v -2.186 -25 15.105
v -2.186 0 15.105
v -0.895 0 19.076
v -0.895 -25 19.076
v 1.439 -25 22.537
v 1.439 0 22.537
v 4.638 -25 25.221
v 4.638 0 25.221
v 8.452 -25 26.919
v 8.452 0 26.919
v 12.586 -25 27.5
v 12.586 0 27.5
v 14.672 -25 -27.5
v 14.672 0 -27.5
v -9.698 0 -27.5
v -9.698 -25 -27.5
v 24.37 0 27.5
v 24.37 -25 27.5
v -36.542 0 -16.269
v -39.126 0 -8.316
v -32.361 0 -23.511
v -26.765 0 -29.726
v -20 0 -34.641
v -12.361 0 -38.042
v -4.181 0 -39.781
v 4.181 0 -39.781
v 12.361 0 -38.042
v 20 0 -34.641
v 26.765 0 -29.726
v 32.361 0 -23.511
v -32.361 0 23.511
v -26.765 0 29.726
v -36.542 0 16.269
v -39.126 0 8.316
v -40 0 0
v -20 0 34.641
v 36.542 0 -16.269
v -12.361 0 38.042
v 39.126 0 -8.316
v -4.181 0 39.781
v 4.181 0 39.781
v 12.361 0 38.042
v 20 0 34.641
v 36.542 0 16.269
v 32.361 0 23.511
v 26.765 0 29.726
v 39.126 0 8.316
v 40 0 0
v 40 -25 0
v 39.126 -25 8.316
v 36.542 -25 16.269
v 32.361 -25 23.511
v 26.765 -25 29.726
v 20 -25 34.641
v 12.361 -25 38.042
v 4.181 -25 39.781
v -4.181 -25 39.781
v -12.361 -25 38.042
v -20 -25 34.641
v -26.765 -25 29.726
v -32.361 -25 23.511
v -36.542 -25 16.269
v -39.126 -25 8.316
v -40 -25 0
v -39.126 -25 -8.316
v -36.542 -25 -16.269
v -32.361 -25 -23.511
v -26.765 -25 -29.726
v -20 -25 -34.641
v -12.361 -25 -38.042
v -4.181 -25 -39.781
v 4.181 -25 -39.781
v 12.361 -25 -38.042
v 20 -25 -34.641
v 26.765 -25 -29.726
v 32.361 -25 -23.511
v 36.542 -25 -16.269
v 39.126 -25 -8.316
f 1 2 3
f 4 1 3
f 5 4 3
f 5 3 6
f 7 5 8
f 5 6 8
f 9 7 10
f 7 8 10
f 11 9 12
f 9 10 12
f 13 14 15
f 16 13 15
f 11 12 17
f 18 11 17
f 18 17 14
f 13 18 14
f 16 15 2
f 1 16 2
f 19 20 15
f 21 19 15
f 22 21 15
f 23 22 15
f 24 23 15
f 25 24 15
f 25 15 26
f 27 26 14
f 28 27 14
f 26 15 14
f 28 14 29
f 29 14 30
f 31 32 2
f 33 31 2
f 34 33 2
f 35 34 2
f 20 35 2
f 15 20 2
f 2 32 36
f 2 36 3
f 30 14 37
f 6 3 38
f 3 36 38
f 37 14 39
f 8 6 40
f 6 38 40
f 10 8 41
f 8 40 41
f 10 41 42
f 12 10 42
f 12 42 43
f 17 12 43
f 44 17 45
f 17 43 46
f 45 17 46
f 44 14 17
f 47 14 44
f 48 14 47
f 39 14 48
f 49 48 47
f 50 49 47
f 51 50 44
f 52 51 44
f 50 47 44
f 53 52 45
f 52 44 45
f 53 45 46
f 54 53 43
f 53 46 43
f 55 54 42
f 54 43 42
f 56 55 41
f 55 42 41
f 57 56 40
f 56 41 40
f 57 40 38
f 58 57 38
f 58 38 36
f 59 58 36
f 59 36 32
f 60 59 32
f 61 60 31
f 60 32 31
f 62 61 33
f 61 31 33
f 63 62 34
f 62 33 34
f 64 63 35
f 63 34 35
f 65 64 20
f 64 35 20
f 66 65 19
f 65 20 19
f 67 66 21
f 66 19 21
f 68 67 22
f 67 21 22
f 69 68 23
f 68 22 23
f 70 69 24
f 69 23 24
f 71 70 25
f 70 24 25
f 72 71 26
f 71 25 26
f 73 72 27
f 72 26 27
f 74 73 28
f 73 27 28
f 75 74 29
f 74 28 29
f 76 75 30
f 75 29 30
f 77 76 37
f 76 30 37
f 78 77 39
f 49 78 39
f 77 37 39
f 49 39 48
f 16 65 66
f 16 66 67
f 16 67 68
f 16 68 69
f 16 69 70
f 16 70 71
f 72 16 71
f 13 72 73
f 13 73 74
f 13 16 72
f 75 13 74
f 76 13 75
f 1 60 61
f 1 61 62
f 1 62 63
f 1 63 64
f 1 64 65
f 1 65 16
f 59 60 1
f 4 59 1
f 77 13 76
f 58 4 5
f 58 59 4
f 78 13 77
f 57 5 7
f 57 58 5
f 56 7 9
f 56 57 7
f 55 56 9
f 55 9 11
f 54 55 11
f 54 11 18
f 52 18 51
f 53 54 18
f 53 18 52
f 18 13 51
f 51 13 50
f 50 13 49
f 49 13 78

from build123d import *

# Parameters (mm, degrees)
F0_R     = 40
F1_DEPTH = 25


with BuildPart() as f1:
    # F0 (on Front) → F1 (new body)
    with BuildSketch(Plane.XZ):
        Circle(F0_R)
        with BuildLine():
            Line((24.370239, 27.5), (14.672255, -27.5))
            Line((14.672255, -27.5), (-9.697984, -27.5))
            Line((-9.697984, -27.5), (-2.185622, 15.104723))
            ThreePointArc((-2.185622, 15.104723), (2.94468, 23.990667), (12.586494, 27.5))
            Line((12.586494, 27.5), (24.370239, 27.5))
        make_face(mode=Mode.SUBTRACT)
    extrude(amount=F1_DEPTH)


solid = f1.part
